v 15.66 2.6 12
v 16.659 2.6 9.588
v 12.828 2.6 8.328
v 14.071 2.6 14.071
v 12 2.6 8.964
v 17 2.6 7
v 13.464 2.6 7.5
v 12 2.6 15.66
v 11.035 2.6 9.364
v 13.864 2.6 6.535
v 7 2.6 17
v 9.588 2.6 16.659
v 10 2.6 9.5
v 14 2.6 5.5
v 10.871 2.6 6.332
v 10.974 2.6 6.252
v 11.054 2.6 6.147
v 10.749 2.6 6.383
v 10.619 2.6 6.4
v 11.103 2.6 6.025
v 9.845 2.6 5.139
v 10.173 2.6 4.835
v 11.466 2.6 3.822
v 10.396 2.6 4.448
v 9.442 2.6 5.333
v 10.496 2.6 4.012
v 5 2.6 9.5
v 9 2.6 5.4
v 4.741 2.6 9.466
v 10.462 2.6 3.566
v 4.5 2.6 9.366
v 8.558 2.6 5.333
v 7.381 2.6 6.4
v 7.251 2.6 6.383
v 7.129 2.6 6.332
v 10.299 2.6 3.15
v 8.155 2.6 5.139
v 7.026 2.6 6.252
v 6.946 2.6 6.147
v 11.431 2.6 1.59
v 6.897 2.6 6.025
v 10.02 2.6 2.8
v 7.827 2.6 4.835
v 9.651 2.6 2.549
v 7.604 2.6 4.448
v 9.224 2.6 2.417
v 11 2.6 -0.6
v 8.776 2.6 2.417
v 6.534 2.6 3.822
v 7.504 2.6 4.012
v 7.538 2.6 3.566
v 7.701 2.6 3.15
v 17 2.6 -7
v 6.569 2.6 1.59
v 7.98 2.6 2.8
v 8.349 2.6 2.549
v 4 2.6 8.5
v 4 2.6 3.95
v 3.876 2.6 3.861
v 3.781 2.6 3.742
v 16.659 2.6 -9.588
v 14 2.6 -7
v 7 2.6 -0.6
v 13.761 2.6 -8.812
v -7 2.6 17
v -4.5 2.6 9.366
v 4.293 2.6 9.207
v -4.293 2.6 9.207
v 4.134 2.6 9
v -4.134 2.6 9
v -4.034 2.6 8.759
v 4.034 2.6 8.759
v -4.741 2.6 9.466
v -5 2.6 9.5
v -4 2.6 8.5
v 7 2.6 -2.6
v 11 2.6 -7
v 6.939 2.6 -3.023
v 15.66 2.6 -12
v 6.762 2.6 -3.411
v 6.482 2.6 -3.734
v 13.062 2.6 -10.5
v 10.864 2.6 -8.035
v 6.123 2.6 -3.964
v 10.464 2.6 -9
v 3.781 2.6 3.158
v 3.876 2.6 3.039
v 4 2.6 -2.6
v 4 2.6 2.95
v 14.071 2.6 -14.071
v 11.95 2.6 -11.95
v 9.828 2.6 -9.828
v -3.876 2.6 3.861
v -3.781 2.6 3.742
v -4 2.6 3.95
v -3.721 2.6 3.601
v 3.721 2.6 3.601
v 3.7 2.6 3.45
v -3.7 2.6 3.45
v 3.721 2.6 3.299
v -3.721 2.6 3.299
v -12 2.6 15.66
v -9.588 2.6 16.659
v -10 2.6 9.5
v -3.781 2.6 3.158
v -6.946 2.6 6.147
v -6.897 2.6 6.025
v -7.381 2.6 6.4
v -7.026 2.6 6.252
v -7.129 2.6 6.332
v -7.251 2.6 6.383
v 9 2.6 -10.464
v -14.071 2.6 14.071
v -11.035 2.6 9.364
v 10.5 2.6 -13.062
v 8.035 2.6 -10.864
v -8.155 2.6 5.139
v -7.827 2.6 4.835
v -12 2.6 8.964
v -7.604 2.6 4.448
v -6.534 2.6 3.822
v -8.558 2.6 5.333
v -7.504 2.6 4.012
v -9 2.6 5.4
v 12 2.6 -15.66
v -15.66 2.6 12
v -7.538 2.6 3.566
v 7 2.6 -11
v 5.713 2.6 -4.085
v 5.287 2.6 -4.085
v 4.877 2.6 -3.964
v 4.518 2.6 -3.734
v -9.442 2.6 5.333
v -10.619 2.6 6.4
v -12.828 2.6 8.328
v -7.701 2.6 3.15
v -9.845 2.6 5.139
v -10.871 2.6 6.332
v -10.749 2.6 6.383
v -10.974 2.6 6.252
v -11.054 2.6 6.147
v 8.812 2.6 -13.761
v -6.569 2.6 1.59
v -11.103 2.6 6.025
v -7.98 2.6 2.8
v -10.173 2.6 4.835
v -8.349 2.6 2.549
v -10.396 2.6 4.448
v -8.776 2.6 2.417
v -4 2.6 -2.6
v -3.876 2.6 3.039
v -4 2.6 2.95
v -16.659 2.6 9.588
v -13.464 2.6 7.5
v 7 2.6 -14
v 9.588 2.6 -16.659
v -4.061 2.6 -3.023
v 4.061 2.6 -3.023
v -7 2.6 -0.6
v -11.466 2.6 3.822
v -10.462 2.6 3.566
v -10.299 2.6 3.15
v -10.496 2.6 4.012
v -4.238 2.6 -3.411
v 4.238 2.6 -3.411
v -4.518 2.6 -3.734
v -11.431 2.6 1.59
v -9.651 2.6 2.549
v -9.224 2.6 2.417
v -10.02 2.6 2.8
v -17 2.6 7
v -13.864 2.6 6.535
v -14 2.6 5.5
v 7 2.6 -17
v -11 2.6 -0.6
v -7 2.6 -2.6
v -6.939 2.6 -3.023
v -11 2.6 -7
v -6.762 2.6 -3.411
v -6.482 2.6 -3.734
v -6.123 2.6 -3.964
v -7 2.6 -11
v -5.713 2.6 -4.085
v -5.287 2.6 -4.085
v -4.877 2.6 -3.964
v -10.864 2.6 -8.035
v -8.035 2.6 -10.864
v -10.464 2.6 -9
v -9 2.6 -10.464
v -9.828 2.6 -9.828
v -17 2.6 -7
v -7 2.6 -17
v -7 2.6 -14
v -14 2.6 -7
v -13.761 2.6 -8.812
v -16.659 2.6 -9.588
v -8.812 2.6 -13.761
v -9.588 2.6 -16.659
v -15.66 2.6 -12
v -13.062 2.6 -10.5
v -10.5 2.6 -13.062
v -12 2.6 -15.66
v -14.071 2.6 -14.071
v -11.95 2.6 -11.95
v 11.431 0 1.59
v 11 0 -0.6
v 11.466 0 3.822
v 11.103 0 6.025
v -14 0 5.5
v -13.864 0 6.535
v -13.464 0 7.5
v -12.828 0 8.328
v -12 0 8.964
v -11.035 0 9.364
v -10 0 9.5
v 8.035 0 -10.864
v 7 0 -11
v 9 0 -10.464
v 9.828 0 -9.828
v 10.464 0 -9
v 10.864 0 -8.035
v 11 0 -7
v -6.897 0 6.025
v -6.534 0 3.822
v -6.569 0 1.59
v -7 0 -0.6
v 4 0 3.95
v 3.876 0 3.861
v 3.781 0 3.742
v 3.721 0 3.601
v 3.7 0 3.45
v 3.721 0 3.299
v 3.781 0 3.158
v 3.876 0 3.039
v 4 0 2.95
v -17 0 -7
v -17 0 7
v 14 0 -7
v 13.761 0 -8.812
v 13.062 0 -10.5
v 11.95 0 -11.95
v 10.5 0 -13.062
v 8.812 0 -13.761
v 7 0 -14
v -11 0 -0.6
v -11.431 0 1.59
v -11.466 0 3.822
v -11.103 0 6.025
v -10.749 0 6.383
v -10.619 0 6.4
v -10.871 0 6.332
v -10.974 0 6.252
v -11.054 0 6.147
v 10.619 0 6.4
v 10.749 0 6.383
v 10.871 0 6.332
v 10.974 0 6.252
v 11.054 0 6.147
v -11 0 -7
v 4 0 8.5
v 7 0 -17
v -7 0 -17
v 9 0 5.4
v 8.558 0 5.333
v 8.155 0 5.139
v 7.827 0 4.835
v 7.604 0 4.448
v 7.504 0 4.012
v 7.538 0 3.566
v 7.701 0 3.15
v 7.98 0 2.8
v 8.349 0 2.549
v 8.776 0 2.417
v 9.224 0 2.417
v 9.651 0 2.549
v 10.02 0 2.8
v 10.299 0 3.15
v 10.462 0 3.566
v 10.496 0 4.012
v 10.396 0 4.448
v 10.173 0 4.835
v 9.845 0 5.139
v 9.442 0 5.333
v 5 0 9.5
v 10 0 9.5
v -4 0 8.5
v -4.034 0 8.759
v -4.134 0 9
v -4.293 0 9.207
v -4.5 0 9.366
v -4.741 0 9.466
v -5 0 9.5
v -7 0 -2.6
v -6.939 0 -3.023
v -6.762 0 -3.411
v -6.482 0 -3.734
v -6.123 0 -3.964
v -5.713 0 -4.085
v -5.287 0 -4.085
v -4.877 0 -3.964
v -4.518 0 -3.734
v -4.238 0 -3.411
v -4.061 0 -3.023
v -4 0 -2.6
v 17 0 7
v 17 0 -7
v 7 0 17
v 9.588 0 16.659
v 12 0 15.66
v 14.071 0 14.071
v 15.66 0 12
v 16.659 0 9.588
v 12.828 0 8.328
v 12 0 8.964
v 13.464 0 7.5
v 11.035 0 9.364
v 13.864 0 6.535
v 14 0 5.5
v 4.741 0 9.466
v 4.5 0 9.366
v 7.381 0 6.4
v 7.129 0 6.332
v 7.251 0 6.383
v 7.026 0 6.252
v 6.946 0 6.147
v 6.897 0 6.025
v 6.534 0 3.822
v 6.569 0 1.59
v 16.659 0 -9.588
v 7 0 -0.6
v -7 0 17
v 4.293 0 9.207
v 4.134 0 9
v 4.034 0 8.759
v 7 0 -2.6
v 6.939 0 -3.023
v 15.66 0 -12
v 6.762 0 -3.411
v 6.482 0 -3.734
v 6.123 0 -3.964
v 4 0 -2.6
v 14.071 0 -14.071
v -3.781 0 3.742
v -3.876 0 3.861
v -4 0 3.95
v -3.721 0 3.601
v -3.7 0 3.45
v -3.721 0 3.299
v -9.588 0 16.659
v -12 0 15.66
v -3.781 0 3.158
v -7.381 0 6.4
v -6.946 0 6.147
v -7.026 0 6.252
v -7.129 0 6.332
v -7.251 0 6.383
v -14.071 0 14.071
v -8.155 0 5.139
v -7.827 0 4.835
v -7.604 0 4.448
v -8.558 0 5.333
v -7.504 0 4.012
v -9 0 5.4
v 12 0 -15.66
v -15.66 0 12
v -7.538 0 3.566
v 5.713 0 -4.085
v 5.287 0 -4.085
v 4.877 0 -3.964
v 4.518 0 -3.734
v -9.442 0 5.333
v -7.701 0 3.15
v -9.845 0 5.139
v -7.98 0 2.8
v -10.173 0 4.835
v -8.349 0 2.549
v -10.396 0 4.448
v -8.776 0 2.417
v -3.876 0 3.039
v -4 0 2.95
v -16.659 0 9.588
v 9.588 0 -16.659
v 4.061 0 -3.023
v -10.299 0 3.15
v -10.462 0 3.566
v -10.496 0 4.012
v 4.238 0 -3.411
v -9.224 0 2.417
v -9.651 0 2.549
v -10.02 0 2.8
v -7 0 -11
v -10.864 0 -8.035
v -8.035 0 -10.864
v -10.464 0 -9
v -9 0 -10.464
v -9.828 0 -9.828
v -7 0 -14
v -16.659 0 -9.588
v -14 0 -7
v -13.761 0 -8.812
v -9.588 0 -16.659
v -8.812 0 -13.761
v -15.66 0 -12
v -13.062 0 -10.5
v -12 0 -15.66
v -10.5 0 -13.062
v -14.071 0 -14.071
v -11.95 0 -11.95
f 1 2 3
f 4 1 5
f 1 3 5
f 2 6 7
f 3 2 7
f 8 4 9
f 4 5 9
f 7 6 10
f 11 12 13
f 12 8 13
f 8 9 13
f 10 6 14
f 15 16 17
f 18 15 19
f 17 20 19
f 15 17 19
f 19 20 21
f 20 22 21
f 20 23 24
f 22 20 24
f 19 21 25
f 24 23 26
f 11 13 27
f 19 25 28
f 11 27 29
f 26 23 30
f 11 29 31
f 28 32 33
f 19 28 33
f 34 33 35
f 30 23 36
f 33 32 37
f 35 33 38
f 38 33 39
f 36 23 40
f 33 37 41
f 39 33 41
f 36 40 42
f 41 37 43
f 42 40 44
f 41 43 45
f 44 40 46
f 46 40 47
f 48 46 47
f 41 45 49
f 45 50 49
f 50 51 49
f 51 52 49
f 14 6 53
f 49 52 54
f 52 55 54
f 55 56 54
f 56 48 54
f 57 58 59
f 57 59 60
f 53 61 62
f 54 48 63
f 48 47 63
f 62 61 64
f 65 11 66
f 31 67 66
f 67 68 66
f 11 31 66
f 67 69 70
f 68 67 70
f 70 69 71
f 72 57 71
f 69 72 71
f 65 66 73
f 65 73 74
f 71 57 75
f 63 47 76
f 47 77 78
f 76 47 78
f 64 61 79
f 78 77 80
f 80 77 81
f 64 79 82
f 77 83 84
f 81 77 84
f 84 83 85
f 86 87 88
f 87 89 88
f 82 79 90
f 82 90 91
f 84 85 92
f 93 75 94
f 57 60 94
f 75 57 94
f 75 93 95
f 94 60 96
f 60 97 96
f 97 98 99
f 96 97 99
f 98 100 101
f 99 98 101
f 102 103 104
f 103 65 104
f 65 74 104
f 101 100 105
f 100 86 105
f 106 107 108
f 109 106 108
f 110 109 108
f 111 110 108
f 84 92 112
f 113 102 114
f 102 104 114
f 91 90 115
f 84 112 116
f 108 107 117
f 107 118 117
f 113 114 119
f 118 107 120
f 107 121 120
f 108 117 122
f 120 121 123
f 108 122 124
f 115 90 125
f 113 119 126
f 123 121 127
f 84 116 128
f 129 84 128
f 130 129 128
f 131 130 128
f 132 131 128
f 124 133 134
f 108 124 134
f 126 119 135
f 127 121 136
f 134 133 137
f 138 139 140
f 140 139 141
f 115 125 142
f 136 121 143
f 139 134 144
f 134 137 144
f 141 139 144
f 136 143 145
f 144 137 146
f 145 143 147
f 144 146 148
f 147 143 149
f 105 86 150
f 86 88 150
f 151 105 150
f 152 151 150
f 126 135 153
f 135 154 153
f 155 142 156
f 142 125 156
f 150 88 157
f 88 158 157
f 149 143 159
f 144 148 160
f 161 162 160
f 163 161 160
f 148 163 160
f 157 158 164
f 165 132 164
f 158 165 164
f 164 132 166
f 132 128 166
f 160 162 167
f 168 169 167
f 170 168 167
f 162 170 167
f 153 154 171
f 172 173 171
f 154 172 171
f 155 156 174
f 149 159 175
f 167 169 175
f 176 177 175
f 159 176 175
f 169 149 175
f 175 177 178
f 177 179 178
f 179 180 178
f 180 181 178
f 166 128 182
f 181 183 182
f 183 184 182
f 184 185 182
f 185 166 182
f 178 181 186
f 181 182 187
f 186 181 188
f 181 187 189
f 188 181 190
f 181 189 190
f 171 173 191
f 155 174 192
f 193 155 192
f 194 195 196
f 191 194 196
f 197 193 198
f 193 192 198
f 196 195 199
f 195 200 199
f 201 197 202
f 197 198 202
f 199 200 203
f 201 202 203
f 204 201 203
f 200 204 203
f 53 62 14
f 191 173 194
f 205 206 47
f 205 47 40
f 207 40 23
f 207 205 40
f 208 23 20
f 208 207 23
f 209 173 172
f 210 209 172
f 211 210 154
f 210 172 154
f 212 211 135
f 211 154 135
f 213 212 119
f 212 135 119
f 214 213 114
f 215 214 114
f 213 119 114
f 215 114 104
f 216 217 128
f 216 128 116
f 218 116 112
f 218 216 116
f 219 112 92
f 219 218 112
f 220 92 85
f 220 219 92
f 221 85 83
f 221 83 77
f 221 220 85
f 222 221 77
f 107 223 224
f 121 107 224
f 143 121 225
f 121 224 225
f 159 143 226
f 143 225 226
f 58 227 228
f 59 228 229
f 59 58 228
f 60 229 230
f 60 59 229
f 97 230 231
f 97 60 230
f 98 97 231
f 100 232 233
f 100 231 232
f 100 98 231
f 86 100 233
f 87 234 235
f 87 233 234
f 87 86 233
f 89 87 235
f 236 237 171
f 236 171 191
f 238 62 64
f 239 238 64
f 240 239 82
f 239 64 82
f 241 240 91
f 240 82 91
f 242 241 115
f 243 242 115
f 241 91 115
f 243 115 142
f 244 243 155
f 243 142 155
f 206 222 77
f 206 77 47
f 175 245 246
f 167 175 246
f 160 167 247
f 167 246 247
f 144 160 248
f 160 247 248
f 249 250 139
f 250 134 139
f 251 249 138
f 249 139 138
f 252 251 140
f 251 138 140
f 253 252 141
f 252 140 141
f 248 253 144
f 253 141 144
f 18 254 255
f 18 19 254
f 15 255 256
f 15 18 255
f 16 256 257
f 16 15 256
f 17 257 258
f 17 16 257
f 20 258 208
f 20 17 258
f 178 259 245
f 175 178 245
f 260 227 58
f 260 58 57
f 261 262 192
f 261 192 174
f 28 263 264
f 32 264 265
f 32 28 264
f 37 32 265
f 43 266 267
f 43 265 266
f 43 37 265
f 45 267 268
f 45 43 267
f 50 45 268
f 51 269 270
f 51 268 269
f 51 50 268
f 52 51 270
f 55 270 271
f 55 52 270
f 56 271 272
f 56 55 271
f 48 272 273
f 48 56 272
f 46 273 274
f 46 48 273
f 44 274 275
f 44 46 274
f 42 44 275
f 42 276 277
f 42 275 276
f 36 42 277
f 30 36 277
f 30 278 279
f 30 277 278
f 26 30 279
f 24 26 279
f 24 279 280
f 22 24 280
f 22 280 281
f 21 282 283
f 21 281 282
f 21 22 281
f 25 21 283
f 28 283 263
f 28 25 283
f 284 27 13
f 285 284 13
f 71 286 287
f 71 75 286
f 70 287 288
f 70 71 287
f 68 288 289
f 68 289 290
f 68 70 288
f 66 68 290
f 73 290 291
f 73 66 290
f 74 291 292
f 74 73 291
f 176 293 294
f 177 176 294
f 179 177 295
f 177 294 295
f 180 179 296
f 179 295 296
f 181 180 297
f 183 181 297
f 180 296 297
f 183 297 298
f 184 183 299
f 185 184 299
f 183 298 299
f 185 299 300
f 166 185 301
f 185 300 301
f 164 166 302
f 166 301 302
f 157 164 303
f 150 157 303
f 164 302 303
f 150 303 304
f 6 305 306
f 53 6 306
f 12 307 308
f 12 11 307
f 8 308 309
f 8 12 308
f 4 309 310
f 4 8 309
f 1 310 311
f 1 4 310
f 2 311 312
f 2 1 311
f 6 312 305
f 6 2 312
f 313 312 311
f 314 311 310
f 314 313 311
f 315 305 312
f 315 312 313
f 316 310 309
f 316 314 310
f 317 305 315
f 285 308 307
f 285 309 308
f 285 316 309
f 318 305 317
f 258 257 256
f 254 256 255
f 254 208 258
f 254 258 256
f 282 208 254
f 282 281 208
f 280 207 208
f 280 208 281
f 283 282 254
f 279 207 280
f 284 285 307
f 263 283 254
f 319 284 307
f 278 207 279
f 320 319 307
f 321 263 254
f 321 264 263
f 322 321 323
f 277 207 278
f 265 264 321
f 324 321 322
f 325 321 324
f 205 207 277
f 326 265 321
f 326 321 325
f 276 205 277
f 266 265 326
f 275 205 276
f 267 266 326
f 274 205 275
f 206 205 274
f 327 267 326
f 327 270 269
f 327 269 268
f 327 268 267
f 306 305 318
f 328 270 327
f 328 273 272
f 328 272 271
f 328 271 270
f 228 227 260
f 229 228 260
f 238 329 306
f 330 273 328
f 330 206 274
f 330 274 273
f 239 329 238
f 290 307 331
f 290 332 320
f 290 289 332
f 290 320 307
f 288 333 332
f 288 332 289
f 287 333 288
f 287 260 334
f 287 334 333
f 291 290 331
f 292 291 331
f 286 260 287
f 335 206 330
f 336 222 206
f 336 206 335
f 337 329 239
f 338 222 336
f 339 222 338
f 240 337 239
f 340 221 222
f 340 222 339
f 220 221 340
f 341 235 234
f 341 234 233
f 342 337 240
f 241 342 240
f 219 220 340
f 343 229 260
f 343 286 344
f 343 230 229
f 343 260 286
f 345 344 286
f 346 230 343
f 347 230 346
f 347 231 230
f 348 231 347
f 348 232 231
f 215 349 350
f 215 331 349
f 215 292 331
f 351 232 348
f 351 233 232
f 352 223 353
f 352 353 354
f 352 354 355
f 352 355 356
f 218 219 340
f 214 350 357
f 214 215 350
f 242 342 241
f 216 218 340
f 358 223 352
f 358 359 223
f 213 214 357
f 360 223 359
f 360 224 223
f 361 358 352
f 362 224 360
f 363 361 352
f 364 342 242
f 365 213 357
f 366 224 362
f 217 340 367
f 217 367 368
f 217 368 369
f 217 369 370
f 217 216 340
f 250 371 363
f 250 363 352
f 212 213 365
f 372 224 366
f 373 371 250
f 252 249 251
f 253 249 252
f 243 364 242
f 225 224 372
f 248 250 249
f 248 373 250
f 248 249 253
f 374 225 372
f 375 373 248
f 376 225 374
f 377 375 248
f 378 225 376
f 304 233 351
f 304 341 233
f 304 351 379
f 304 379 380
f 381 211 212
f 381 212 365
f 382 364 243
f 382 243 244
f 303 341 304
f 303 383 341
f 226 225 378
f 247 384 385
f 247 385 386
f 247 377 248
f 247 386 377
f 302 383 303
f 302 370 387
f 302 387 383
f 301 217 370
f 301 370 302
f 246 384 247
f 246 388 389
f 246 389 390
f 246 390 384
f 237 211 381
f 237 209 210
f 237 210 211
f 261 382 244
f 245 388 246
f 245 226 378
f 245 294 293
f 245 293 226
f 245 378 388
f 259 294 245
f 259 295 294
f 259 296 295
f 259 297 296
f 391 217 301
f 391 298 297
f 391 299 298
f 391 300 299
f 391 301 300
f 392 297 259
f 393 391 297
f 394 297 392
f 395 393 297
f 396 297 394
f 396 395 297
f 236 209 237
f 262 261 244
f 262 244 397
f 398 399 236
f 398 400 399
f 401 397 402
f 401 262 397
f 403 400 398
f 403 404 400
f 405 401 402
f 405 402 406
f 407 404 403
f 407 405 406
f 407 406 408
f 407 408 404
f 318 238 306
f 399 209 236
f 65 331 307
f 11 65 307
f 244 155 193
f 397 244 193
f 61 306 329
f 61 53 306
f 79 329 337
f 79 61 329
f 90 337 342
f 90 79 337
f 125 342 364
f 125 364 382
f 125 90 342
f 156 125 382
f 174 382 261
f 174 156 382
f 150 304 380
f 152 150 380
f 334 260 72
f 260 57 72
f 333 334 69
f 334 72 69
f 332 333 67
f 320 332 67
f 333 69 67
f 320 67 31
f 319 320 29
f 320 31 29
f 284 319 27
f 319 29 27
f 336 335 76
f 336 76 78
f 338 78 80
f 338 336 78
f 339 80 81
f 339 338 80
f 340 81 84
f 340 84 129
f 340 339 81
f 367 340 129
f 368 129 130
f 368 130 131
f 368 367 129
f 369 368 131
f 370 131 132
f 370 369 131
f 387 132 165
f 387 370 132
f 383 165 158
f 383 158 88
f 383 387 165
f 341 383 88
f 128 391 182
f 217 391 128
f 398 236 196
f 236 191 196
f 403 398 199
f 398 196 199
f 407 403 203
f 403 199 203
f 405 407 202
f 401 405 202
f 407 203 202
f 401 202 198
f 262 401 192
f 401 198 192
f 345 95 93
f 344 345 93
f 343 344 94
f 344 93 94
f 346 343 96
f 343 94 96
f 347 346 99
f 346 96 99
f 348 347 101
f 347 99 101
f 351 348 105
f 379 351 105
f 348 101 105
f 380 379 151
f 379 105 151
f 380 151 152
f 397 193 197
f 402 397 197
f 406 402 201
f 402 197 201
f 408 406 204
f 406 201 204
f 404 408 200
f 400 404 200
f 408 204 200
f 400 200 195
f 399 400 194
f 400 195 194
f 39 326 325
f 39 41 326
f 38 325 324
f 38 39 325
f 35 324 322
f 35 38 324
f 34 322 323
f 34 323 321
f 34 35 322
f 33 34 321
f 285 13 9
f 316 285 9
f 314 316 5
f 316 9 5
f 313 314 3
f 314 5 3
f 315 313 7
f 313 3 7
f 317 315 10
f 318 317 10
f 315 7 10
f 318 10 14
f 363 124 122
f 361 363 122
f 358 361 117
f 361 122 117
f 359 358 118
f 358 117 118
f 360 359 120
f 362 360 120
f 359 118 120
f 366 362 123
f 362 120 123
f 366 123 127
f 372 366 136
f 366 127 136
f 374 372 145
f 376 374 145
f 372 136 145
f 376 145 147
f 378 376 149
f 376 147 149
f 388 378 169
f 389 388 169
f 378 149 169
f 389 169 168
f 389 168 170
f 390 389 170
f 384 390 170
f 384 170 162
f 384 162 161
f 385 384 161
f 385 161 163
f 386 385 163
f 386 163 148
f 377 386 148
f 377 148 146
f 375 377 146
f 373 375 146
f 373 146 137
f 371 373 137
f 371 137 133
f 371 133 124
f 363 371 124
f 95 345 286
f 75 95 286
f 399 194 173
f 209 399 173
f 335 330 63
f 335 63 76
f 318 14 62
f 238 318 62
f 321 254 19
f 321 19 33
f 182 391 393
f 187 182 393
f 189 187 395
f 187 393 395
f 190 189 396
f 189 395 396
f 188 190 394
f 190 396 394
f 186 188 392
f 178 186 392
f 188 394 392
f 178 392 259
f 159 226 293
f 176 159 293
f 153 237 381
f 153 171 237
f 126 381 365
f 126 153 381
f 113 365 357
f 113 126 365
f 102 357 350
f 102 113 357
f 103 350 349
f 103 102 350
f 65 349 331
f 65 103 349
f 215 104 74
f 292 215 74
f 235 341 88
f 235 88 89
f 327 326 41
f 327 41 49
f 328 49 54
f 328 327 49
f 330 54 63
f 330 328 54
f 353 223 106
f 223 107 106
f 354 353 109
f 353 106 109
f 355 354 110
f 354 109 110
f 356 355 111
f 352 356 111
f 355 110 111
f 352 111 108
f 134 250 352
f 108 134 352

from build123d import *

# Parameters (mm, degrees)
SKETCH1_W                        = 34
SKETCH1_H                        = 34
BASE_DEPTH                       = 2.6
BASE_FILLET_R                    = 10
INNER_CUT_DEPTH                  = 25.181811347
INNER_LEFT_PROFILE_DEPTH         = 2.6
SKETCH5_R                        = 1.5
RIVET_HOLE_DEPTH                 = 25.181811347
GROOVED_PARTIAL_CIRCLE_CUT_DEPTH = 25.181811347
ILP_F_R                          = 0.5
IC_F_R                           = 1
ILP_F_OF_MIRROR_INNER_FEATURES_R = 0.5
IC_F_OF_MIRROR_INNER_FEATURES_R  = 1


with BuildPart() as part:
    # Sketch1 → BASE (new body)
    with BuildSketch(Plane(origin=(0, 0, 0), x_dir=(1, 0, 0), z_dir=(0, 1, 0))):
        Rectangle(SKETCH1_W, SKETCH1_H)
    extrude(amount=BASE_DEPTH)

    # BASE FILLET
    base_fillet_edges = [part.edges().sort_by_distance(p)[0] for p in [
        (17, 1.3, 17),
        (-17, 1.3, 17),
        (-17, 1.3, -17),
        (17, 1.3, -17),
    ]]
    fillet(base_fillet_edges, radius=BASE_FILLET_R)

    # Sketch3 → INNER CUT (cut, through all)
    with BuildSketch(Plane(origin=(0, 2.6, 0), x_dir=(1, 0, 0), z_dir=(0, 1, 0))):
        with BuildLine():
            Line((-10, -9.5), (10, -9.5))
            ThreePointArc((10, -9.5), (12.828427125, -8.328427125), (14, -5.5))
            Line((14, -5.5), (14, 7))
            ThreePointArc((14, 7), (11.949747468, 11.949747468), (7, 14))
            Line((7, 14), (-7, 14))
            ThreePointArc((-7, 14), (-11.949747468, 11.949747468), (-14, 7))
            Line((-14, 7), (-14, -5.5))
            ThreePointArc((-14, -5.5), (-12.828427125, -8.328427125), (-10, -9.5))
        make_face()
    extrude(amount=-INNER_CUT_DEPTH, mode=Mode.SUBTRACT)

    # Sketch4 → INNER LEFT PROFILE (add)
    with BuildSketch(Plane(origin=(0, 0, 0), x_dir=(1, 0, 0), z_dir=(0, 1, 0))):
        with BuildLine():
            Line((-4, 2.6), (-4, -9.5))
            Line((-4, -9.5), (0, -9.5))
            Line((0, -9.5), (0, 11))
            Line((0, 11), (-7, 11))
            ThreePointArc((-7, 11), (-9.828427125, 9.828427125), (-11, 7))
            Line((-11, 7), (-11, 0.6))
            ThreePointArc((-11, 0.6), (-11.5, -2.9), (-11, -6.4))
            Line((-11, -6.4), (-7, -6.4))
            ThreePointArc((-7, -6.4), (-6.5, -2.9), (-7, 0.6))
            Line((-7, 0.6), (-7, 2.6))
            ThreePointArc((-7, 2.6), (-5.5, 4.1), (-4, 2.6))
        make_face()
    inner_left_profile = extrude(amount=INNER_LEFT_PROFILE_DEPTH)

    # Sketch5 → RIVET HOLE (cut, through all)
    with BuildSketch(Plane(origin=(0, 2.6, 0), x_dir=(1, 0, 0), z_dir=(0, 1, 0))):
        with Locations(Location((-9, -3.9, 0), (0, 0, 270))):
            Circle(SKETCH5_R)
    rivet_hole = extrude(amount=-RIVET_HOLE_DEPTH, mode=Mode.SUBTRACT)

    # Sketch6 → GROOVED PARTIAL CIRCLE CUT (cut, through all)
    with BuildSketch(Plane(origin=(0, 2.6, 0), x_dir=(1, 0, 0), z_dir=(0, 1, 0))):
        with BuildLine():
            Line((-4, -2.95), (-4, -3.95))
            ThreePointArc((-4, -3.95), (-3.7, -3.45), (-4, -2.95))
        make_face()
    grooved_partial_circle_cut = extrude(amount=-GROOVED_PARTIAL_CIRCLE_CUT_DEPTH, mode=Mode.SUBTRACT)

    # ILP F
    ilp_f_edges = [part.edges().sort_by_distance(p)[0] for p in [
        (-11, 1.3, 6.4),
        (-7, 1.3, 6.4),
    ]]
    fillet(ilp_f_edges, radius=ILP_F_R)

    # IC F
    ic_f_edges = [part.edges().sort_by_distance(p)[0] for p in [
        (-4, 1.3, 9.5),
    ]]
    fillet(ic_f_edges, radius=IC_F_R)

    # MIRROR INNER FEATURES: INNER LEFT PROFILE, RIVET HOLE, GROOVED PARTIAL CIRCLE CUT across plane
    add(inner_left_profile.mirror(Plane(origin=(0, 0, 0), x_dir=(0, 0, 1), z_dir=(1, 0, 0))))
    add(rivet_hole.mirror(Plane(origin=(0, 0, 0), x_dir=(0, 0, 1), z_dir=(1, 0, 0))), mode=Mode.SUBTRACT)
    add(grooved_partial_circle_cut.mirror(Plane(origin=(0, 0, 0), x_dir=(0, 0, 1), z_dir=(1, 0, 0))), mode=Mode.SUBTRACT)

    # ILP F of MIRROR INNER FEATURES
    ilp_f_of_mirror_inner_features_edges = [part.edges().sort_by_distance(p)[0] for p in [
        (11, 1.3, 6.4),
        (7, 1.3, 6.4),
    ]]
    fillet(ilp_f_of_mirror_inner_features_edges, radius=ILP_F_OF_MIRROR_INNER_FEATURES_R)

    # IC F of MIRROR INNER FEATURES
    ic_f_of_mirror_inner_features_edges = [part.edges().sort_by_distance(p)[0] for p in [
        (4, 1.3, 9.5),
    ]]
    fillet(ic_f_of_mirror_inner_features_edges, radius=IC_F_OF_MIRROR_INNER_FEATURES_R)


solid = part.part
